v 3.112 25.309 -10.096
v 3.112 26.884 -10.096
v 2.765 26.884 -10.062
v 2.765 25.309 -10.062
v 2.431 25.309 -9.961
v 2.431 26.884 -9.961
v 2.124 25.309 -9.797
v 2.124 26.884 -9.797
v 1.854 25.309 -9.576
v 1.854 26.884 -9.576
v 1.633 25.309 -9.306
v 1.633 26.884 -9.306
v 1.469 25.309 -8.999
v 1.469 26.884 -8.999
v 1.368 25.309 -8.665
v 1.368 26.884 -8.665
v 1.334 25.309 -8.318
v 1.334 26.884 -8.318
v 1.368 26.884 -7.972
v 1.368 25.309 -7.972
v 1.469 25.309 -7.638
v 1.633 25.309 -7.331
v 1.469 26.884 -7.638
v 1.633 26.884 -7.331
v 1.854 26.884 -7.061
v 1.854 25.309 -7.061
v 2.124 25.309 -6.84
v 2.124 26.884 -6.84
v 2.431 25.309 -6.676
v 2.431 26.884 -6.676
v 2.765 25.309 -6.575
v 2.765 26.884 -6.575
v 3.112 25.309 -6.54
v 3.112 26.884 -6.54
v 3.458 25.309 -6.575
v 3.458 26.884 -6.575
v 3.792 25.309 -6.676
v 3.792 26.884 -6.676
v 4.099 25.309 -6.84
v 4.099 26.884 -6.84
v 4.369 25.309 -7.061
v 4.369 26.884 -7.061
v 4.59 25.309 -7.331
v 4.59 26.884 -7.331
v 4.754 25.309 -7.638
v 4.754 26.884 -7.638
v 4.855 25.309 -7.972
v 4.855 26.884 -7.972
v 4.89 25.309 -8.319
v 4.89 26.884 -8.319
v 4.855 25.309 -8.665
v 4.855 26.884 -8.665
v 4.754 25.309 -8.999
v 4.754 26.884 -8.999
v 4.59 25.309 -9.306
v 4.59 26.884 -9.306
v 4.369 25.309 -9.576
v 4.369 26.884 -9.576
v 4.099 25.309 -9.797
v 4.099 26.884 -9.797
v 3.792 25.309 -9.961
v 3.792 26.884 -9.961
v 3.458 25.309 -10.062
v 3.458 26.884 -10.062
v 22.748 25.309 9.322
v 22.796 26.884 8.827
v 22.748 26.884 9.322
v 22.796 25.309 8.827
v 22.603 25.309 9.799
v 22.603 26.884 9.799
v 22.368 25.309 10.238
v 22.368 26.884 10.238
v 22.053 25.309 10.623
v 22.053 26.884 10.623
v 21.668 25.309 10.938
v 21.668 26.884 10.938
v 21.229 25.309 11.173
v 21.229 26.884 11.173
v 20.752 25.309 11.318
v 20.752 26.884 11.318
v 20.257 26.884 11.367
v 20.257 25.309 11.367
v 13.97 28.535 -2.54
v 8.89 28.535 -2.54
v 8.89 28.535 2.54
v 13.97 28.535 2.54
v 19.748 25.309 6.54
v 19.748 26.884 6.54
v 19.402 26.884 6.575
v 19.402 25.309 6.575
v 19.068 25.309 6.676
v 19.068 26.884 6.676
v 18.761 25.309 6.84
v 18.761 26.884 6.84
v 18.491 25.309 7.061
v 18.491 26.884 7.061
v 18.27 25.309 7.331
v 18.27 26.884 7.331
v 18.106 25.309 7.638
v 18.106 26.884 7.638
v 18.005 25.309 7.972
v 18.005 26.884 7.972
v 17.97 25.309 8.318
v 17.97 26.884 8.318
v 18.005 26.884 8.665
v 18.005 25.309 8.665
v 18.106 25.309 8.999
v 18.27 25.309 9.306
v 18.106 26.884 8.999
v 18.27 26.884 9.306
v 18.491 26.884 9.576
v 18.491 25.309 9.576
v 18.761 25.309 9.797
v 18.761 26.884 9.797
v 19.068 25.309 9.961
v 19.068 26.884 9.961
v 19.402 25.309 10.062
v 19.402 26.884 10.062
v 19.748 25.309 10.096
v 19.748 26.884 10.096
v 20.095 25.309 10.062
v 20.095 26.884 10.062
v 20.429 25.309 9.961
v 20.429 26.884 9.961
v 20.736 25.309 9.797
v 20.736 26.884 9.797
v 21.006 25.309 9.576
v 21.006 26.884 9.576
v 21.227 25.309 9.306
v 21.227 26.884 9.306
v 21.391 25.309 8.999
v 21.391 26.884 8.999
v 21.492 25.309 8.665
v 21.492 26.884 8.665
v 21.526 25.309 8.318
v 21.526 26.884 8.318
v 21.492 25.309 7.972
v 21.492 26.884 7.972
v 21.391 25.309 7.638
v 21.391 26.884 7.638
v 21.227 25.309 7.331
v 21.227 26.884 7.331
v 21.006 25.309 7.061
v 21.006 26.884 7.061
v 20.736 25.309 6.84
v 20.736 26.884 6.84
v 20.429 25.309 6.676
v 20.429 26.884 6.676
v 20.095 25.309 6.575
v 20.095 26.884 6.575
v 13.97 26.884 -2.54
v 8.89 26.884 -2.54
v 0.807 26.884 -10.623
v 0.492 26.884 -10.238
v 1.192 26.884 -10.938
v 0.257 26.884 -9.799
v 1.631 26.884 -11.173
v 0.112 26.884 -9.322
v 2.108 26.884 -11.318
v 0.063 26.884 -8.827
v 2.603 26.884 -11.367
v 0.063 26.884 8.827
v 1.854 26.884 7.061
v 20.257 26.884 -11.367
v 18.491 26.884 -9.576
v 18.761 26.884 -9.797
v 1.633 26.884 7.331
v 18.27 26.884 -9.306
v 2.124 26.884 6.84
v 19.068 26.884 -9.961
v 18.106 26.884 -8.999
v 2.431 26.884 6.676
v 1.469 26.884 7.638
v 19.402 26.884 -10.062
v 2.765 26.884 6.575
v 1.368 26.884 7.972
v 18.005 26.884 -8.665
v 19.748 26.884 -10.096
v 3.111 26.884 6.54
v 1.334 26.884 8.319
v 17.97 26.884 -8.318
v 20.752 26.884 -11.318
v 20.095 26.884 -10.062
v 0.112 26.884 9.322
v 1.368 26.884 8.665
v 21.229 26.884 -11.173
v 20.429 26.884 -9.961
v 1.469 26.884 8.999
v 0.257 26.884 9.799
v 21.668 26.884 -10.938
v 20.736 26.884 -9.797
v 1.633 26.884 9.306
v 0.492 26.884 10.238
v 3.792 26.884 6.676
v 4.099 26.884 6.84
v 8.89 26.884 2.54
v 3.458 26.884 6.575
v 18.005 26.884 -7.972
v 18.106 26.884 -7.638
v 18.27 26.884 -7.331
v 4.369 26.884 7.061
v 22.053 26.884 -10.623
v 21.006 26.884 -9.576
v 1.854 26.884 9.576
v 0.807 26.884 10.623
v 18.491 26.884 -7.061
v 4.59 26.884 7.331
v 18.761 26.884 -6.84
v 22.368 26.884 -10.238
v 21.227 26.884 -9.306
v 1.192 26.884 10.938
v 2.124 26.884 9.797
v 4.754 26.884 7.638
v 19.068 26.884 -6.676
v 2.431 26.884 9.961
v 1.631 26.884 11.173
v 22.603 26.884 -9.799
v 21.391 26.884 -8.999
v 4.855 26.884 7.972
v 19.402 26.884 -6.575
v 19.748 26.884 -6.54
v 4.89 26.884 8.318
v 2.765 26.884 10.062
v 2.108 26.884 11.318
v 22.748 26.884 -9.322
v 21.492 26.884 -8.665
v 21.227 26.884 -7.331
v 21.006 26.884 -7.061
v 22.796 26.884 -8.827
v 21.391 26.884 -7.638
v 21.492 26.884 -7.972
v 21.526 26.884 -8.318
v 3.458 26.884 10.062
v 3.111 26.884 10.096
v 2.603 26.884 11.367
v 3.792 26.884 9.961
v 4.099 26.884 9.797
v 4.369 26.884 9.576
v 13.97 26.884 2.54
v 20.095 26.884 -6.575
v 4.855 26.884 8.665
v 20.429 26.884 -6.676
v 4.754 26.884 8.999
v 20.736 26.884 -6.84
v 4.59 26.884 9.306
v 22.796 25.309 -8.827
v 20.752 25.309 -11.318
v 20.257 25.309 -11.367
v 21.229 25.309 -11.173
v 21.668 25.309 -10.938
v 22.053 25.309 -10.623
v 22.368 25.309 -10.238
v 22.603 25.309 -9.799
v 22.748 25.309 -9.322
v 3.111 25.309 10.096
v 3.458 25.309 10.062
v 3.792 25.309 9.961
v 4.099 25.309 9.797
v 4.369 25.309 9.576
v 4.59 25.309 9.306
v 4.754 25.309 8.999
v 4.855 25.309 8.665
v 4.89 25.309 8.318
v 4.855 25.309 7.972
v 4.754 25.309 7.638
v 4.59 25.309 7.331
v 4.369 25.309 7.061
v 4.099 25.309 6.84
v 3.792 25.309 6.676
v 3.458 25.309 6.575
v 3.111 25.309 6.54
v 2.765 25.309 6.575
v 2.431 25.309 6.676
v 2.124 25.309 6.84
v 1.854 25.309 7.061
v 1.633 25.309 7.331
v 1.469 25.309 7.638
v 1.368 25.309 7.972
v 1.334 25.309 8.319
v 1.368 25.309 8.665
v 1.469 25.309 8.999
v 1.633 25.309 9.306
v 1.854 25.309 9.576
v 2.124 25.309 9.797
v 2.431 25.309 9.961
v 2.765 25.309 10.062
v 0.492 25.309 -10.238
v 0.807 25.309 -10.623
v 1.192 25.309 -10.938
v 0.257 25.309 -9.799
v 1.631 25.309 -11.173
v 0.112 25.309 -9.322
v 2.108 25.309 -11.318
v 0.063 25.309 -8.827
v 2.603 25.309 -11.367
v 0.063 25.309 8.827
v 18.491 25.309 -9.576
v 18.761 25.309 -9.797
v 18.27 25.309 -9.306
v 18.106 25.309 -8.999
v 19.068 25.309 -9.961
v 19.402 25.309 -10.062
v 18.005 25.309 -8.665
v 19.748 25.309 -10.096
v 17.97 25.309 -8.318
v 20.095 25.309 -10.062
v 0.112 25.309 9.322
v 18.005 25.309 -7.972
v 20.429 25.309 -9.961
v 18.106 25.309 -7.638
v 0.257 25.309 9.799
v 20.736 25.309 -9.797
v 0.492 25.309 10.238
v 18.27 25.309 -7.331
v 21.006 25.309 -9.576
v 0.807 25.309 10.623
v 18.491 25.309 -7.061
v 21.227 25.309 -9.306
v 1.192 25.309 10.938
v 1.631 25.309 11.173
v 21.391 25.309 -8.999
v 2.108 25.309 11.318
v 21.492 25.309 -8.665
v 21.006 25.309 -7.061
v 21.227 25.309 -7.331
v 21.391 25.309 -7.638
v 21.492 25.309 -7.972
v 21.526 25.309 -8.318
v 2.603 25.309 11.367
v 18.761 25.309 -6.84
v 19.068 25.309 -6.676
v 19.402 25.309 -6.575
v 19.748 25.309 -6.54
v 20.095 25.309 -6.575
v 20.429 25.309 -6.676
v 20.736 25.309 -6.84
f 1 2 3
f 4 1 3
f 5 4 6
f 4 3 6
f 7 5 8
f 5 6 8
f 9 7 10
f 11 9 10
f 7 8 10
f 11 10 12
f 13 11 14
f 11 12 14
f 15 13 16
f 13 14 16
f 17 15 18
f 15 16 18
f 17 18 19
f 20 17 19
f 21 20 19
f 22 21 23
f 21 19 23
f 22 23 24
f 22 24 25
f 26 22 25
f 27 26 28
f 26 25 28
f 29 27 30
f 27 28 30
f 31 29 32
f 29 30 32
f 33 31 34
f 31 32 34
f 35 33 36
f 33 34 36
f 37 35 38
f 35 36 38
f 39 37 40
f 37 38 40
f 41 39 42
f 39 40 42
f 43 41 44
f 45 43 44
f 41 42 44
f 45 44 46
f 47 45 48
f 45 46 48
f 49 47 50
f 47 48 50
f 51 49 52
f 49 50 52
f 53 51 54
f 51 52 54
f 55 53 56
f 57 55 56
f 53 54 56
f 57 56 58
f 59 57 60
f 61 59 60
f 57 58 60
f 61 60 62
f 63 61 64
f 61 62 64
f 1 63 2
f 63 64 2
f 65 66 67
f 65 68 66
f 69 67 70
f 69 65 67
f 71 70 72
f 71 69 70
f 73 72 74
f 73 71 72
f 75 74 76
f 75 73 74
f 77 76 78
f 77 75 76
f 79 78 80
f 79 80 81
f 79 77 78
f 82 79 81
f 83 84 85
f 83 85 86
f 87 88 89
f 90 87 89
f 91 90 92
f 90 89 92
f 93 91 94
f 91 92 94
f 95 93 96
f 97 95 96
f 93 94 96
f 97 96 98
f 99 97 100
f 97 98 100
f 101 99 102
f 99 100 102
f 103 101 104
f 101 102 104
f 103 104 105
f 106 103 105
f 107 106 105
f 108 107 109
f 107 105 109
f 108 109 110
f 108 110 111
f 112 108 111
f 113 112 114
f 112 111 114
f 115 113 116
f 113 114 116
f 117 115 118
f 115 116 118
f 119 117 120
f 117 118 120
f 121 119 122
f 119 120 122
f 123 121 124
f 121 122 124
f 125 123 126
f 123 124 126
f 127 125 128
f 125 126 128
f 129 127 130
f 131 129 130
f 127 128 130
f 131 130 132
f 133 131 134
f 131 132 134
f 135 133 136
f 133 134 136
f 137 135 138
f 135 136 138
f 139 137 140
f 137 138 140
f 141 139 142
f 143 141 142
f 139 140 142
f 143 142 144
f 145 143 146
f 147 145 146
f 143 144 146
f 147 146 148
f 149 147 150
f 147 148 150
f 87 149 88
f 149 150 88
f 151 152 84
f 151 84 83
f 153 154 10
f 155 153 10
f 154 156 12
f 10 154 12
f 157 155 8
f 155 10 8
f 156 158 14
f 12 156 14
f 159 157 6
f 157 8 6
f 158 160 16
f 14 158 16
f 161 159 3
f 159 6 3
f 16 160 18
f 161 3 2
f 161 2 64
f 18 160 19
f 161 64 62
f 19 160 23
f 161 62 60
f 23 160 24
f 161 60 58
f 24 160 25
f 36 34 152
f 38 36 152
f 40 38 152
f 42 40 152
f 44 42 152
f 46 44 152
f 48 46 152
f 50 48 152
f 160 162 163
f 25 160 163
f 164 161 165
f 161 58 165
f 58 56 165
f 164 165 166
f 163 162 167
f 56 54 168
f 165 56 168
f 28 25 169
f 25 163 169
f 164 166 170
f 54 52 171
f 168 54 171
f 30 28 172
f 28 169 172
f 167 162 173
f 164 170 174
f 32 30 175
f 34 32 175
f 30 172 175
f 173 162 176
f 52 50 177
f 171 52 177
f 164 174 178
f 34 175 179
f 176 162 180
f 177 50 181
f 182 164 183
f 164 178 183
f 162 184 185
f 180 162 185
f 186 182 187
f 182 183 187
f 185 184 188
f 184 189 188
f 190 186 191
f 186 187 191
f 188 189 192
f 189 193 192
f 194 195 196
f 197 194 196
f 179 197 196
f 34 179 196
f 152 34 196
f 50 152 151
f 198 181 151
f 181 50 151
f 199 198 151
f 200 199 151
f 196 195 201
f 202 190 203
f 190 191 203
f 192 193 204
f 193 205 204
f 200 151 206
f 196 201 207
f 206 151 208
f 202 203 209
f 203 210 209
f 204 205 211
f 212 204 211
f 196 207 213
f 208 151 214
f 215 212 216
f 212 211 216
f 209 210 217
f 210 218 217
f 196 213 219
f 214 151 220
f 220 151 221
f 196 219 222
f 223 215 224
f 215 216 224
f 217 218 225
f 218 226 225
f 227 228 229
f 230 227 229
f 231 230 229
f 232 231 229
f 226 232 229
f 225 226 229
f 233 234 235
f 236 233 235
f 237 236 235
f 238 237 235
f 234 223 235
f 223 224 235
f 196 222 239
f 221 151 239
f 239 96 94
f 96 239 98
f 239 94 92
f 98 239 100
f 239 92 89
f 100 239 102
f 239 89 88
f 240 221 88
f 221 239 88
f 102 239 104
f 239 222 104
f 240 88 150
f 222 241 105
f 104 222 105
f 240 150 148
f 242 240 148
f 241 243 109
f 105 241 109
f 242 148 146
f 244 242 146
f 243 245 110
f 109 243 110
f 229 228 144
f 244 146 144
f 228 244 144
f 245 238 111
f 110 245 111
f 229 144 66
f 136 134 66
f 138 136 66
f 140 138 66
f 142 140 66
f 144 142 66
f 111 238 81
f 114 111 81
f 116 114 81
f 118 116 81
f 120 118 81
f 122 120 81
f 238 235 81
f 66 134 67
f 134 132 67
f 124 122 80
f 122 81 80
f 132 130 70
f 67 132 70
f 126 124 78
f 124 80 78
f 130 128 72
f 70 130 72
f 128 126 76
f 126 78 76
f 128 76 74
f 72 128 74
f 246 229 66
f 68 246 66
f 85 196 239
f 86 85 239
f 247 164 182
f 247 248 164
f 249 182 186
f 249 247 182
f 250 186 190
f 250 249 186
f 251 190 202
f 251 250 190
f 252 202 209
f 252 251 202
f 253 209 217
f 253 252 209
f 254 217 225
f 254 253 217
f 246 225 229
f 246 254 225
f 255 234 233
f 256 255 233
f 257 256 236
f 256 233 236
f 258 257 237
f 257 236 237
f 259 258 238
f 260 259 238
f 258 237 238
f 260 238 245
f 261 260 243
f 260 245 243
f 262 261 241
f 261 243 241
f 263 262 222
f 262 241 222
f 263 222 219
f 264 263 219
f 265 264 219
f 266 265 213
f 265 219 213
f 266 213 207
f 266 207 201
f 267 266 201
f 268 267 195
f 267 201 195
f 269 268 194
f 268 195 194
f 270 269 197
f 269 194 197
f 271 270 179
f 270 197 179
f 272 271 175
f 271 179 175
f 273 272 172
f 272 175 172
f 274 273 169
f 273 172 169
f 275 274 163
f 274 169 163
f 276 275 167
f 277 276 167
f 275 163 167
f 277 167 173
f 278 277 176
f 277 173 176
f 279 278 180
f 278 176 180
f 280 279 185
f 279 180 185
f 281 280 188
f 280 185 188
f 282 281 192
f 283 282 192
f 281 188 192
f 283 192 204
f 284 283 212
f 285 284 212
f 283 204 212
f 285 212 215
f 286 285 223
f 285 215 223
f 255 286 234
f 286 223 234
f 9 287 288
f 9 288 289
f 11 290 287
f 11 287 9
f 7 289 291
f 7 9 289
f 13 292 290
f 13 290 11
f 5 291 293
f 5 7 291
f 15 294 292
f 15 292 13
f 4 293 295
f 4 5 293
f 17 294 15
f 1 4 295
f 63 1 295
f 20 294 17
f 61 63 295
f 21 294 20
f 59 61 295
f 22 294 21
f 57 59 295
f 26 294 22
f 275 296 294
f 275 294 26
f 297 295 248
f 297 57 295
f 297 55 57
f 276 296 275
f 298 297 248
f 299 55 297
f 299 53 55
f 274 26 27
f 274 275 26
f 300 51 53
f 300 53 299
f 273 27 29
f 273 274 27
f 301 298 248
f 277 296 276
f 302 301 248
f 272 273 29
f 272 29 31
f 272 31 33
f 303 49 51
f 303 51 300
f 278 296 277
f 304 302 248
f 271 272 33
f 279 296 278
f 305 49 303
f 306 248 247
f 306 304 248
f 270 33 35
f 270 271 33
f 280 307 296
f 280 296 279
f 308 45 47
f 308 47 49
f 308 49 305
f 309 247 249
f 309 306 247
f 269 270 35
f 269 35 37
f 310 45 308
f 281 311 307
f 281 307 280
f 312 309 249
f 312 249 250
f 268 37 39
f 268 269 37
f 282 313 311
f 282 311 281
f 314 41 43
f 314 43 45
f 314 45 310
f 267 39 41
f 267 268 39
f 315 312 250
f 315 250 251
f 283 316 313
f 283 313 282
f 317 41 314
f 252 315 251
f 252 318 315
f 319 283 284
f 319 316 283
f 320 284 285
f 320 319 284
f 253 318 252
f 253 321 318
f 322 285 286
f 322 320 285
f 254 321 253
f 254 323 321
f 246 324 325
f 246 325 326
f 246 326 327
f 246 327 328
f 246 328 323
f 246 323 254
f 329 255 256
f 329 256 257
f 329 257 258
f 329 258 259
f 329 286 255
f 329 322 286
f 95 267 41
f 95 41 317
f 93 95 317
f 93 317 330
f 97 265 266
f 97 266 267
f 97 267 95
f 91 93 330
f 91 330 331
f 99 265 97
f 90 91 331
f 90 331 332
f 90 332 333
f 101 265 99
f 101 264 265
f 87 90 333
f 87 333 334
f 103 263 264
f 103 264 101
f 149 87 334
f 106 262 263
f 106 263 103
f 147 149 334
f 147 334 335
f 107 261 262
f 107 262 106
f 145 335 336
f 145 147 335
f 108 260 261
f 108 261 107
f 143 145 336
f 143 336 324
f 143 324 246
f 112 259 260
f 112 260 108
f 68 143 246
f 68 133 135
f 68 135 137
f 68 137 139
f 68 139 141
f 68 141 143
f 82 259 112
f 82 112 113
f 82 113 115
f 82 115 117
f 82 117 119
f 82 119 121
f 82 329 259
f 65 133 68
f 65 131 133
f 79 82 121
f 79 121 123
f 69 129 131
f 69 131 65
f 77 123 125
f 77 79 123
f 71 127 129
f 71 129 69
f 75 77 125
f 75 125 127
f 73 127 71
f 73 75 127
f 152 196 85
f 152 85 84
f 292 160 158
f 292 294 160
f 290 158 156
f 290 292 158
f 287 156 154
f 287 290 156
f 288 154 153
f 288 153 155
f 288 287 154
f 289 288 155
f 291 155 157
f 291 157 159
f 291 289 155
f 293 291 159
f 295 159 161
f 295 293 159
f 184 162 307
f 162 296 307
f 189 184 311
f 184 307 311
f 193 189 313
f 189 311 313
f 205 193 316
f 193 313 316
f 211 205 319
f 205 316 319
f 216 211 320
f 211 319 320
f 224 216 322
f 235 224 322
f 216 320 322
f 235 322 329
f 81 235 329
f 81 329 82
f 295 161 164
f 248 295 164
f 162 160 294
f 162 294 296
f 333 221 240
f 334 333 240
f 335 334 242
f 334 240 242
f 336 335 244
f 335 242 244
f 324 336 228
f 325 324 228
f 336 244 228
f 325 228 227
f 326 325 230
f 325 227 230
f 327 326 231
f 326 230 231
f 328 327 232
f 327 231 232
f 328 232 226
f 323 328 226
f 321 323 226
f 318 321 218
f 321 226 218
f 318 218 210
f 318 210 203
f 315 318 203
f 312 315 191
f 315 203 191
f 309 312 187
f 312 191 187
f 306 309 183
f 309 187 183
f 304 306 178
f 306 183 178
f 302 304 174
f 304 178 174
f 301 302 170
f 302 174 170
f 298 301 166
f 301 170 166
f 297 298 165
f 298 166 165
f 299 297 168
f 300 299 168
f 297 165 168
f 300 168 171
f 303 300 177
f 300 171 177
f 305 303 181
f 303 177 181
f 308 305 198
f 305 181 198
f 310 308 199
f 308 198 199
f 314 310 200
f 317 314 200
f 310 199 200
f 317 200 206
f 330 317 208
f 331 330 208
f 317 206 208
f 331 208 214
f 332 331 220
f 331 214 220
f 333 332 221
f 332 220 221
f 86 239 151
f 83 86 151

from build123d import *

# Parameters (mm, degrees)
SKETCH1_W           = 22.733
SKETCH1_H           = 22.733
BOSS_EXTRUDE1_DEPTH = 1.5748
FILLET1_R           = 2.54
SKETCH2_R           = 1.778
CUT_EXTRUDE1_DEPTH  = 1.5748
SKETCH3_W           = 5.08
SKETCH3_H           = 5.08
BOSS_EXTRUDE2_DEPTH = 1.651


with BuildPart() as part:
    # Sketch1 → Boss-Extrude1 (new body)
    with BuildSketch(Plane.XZ.offset(-26.884)):
        with Locations((11.43, 0)):
            Rectangle(SKETCH1_W, SKETCH1_H)
    extrude(amount=BOSS_EXTRUDE1_DEPTH)

    # Fillet1
    fillet1_edges = [part.edges().sort_by_distance(p)[0] for p in [
        (0.0635, 26.0966, 11.3665),
        (22.7965, 26.0966, 11.3665),
        (22.7965, 26.0966, -11.3665),
        (0.0635, 26.0966, -11.3665),
    ]]
    fillet(fillet1_edges, radius=FILLET1_R)

    # Sketch2 → Cut-Extrude1 (cut)
    with BuildSketch(Plane(origin=(0, 26.884, 0), x_dir=(1, 0, 0), z_dir=(0, 1, 0))):
        with Locations(Location((19.7485, 8.3185, 0), (0, 0, 270))):
            Circle(SKETCH2_R)
        with Locations(Location((3.1115, 8.3185, 0), (0, 0, 90))):
            Circle(SKETCH2_R)
        with Locations(Location((19.7485, -8.3185, 0), (0, 0, 90))):
            Circle(SKETCH2_R)
        with Locations(Location((3.1115, -8.3185, 0), (0, 0, 270))):
            Circle(SKETCH2_R)
    extrude(amount=-CUT_EXTRUDE1_DEPTH, mode=Mode.SUBTRACT)

    # Sketch3 → Boss-Extrude2 (add)
    with BuildSketch(Plane(origin=(0, 26.884, 0), x_dir=(1, 0, 0), z_dir=(0, 1, 0))):
        with Locations((11.43, 0)):
            Rectangle(SKETCH3_W, SKETCH3_H)
    extrude(amount=BOSS_EXTRUDE2_DEPTH)


solid = part.part
